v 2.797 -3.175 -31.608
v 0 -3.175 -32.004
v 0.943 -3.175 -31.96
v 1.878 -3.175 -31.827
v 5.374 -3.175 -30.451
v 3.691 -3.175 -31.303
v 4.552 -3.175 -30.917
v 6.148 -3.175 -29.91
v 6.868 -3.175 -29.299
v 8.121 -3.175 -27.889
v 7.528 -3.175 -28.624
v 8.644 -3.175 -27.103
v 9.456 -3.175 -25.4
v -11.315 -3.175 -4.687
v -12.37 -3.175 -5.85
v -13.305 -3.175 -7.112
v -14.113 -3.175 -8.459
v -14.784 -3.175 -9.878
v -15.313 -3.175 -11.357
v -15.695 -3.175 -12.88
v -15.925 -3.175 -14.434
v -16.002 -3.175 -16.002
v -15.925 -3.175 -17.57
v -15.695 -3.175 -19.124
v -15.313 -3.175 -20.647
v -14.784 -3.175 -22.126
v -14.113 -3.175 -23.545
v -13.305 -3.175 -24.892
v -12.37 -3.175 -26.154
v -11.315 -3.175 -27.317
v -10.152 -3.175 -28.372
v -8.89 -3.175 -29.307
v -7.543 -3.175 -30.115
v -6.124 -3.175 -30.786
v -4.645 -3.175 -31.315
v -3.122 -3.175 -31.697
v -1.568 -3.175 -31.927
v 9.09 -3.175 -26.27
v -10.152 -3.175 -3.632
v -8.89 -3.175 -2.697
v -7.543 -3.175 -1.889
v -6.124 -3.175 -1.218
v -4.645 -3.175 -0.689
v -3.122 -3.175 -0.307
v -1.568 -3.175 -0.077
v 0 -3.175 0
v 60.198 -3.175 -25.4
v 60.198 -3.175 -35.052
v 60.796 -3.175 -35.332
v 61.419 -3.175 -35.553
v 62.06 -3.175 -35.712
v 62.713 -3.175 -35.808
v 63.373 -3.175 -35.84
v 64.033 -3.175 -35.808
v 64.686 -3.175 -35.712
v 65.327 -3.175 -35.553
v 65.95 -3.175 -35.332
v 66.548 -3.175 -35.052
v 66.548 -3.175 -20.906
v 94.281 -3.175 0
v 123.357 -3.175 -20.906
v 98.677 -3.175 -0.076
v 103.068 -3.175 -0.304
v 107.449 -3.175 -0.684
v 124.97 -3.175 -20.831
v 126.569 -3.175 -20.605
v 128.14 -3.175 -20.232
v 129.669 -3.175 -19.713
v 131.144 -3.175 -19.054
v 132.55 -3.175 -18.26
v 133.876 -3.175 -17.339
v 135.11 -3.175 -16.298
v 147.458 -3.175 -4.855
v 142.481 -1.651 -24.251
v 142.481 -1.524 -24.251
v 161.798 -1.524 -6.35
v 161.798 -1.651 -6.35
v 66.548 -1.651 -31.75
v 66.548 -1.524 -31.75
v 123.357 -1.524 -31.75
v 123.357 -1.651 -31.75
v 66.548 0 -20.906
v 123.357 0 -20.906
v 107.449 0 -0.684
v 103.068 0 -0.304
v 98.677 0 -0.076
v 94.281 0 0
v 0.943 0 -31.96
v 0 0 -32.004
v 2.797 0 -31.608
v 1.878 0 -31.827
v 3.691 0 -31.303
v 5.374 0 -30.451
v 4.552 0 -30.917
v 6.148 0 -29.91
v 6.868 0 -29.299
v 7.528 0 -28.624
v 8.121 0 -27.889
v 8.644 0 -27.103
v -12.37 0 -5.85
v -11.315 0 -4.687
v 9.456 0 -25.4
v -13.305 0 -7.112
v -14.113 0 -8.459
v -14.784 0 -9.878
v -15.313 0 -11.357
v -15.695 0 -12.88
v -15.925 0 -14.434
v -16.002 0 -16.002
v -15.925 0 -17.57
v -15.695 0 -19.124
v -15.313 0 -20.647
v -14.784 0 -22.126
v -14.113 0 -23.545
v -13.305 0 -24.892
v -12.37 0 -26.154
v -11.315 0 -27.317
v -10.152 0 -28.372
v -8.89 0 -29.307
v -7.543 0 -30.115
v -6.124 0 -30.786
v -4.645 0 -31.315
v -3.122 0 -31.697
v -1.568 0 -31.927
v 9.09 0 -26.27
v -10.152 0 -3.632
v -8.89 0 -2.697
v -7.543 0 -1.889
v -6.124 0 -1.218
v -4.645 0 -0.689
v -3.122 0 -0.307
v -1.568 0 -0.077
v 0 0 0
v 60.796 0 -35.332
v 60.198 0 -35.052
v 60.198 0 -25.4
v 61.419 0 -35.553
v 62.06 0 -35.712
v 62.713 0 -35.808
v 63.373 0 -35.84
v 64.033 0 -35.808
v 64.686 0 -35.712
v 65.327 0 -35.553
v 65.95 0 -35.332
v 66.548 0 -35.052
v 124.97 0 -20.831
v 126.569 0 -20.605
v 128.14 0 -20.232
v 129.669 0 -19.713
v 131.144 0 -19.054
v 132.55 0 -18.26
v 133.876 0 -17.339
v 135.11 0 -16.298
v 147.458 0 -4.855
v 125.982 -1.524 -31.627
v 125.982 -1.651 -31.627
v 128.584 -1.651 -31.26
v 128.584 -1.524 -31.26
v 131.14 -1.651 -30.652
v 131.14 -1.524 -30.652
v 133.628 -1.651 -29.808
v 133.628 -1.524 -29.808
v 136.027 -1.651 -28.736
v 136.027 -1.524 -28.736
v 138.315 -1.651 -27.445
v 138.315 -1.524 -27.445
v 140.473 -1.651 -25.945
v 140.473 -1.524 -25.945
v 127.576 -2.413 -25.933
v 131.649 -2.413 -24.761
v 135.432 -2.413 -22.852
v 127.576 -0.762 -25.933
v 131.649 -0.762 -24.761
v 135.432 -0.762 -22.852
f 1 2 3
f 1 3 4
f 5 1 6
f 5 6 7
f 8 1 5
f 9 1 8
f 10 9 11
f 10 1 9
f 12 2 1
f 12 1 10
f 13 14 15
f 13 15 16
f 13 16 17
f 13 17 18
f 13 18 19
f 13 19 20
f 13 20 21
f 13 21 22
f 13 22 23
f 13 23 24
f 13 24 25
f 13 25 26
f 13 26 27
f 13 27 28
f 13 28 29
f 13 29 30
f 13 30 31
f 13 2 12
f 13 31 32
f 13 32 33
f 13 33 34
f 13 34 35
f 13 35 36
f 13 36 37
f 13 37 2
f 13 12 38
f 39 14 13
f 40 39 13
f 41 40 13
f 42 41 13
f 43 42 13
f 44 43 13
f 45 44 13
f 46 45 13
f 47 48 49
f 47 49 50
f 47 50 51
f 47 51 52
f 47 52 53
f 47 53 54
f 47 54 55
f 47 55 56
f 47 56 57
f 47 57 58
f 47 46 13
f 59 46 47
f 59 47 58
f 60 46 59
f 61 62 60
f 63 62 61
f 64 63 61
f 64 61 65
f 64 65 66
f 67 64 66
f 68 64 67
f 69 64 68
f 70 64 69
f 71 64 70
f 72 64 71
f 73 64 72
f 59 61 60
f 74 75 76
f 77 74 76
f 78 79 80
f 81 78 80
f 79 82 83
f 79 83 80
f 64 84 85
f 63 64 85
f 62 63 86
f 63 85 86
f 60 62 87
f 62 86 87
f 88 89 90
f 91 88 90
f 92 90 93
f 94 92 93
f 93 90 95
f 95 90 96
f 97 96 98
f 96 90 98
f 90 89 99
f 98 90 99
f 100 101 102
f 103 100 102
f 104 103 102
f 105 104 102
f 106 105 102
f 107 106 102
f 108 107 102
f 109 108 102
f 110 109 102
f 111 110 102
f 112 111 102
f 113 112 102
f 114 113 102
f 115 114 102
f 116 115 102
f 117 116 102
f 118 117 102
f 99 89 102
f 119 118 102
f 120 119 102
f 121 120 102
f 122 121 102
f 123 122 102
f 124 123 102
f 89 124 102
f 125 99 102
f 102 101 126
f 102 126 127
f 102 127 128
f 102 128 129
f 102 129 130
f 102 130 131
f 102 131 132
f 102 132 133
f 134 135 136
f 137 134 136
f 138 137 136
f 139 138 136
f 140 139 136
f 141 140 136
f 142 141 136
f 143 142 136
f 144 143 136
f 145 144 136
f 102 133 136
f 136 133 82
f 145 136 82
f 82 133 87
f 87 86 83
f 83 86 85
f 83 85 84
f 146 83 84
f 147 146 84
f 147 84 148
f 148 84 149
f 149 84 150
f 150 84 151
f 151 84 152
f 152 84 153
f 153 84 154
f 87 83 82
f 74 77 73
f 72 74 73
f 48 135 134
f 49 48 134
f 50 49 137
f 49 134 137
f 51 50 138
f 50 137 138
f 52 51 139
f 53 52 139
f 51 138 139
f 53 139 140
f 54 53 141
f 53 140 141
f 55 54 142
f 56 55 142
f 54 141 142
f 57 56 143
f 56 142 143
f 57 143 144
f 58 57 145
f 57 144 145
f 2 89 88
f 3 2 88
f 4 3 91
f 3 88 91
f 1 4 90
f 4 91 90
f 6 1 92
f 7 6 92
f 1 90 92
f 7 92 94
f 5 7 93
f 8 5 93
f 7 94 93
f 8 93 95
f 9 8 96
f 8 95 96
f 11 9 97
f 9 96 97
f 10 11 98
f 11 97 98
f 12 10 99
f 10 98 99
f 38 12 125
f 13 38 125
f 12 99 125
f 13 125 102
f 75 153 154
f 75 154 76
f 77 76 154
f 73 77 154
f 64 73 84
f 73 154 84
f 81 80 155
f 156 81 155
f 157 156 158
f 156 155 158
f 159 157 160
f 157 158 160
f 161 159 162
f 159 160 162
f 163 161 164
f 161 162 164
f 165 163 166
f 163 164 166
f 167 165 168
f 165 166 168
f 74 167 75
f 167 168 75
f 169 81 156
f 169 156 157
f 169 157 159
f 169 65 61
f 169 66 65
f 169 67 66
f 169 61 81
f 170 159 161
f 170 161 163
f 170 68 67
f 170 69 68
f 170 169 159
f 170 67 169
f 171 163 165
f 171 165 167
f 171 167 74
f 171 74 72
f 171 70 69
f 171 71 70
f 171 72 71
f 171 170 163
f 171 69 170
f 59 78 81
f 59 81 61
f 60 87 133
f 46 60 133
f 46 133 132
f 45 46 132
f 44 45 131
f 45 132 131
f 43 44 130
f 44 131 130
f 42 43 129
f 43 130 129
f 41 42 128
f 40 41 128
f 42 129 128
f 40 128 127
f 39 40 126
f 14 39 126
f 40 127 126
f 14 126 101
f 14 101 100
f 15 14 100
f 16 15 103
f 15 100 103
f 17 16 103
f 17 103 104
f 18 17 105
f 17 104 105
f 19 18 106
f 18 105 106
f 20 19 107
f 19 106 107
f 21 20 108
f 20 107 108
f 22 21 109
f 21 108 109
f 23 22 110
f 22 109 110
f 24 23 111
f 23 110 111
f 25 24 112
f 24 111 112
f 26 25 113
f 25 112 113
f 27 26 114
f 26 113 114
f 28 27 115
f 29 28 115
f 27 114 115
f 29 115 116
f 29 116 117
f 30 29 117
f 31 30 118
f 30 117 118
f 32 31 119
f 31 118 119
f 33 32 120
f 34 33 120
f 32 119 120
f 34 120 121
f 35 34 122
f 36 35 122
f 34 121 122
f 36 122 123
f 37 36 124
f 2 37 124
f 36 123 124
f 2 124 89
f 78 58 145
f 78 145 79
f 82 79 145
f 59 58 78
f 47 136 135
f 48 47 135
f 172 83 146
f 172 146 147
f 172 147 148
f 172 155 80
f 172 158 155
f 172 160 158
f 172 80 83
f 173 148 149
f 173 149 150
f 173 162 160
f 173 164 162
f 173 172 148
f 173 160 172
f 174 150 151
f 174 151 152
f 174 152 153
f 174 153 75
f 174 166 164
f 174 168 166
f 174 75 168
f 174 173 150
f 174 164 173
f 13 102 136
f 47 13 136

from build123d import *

# Parameters (mm, degrees)
F1_DEPTH = 3.175


with BuildPart() as f1:
    # F0 (on Front) → F1 (new body)
    with BuildSketch(Plane.XZ):
        with BuildLine():
            Line((94.2812450191, 0), (0, 0))
            ThreePointArc((0, 0), (-16.002, -16.002), (0, -32.004))
            ThreePointArc((0, -32.004), (5.7669601924, -30.1895691641), (9.4561357565, -25.4))
            Line((9.4561357565, -25.4), (60.198, -25.4))
            Line((60.198, -25.4), (60.198, -35.052))
            ThreePointArc((60.198, -35.052), (63.373, -35.8398051697), (66.548, -35.052))
            Line((66.548, -35.052), (66.548, -31.75))
            Line((66.548, -31.75), (123.3573333658, -31.75))
            ThreePointArc((123.3573333658, -31.75), (133.627989797, -29.808331099), (142.4810210729, -24.2513266114))
            Line((142.4810210729, -24.2513266114), (161.798, -6.35))
            Line((161.798, -6.35), (107.4487924851, -0.6844598091))
            ThreePointArc((107.4487924851, -0.6844598091), (100.873907446, -0.1712303847), (94.2812450191, 0))
        make_face()
    extrude(amount=F1_DEPTH)

    # F3: sweep along a path in F3_path
    with BuildLine(Plane(origin=(66.548, -3.175, -31.75), x_dir=(0, 0, -1), z_dir=(0, 1, 0))) as f3_path:
        Line((0, 0), (0, -56.8093333658))
        ThreePointArc((0, -56.8093333658), (-1.941668901, -67.079989797), (-7.4986733886, -75.9330210729))
        Line((-7.4986733886, -75.9330210729), (-25.4, -95.25))
    # F2 (on face) → F3 (sweep, cut)
    with BuildSketch(Plane.YZ.offset(66.548)):
        Polygon((-3.175, -31.75), (-1.651, -31.75), (-3.175, -20.9061765431), align=None)
    sweep(path=f3_path.line, mode=Mode.SUBTRACT)

    # F5: sweep along a path in F5_path
    with BuildLine(Plane(origin=(123.3573333658, 0, -31.75), x_dir=(0, 0, -1), z_dir=(0, 1, 0))) as f5_path:
        Line((0, 56.8093333658), (0, 0))
        ThreePointArc((0, 0), (-1.941668901, -10.2706564312), (-7.4986733886, -19.1236877071))
        Line((-7.4986733886, -19.1236877071), (-25.4, -38.4406666342))
    # F4 (on face) → F5 (sweep, cut)
    with BuildSketch(Plane.YZ.offset(66.548)):
        Polygon((0, -20.9061765431), (-1.524, -31.75), (0, -31.75), align=None)
    sweep(path=f5_path.line, mode=Mode.SUBTRACT)


solid = f1.part
